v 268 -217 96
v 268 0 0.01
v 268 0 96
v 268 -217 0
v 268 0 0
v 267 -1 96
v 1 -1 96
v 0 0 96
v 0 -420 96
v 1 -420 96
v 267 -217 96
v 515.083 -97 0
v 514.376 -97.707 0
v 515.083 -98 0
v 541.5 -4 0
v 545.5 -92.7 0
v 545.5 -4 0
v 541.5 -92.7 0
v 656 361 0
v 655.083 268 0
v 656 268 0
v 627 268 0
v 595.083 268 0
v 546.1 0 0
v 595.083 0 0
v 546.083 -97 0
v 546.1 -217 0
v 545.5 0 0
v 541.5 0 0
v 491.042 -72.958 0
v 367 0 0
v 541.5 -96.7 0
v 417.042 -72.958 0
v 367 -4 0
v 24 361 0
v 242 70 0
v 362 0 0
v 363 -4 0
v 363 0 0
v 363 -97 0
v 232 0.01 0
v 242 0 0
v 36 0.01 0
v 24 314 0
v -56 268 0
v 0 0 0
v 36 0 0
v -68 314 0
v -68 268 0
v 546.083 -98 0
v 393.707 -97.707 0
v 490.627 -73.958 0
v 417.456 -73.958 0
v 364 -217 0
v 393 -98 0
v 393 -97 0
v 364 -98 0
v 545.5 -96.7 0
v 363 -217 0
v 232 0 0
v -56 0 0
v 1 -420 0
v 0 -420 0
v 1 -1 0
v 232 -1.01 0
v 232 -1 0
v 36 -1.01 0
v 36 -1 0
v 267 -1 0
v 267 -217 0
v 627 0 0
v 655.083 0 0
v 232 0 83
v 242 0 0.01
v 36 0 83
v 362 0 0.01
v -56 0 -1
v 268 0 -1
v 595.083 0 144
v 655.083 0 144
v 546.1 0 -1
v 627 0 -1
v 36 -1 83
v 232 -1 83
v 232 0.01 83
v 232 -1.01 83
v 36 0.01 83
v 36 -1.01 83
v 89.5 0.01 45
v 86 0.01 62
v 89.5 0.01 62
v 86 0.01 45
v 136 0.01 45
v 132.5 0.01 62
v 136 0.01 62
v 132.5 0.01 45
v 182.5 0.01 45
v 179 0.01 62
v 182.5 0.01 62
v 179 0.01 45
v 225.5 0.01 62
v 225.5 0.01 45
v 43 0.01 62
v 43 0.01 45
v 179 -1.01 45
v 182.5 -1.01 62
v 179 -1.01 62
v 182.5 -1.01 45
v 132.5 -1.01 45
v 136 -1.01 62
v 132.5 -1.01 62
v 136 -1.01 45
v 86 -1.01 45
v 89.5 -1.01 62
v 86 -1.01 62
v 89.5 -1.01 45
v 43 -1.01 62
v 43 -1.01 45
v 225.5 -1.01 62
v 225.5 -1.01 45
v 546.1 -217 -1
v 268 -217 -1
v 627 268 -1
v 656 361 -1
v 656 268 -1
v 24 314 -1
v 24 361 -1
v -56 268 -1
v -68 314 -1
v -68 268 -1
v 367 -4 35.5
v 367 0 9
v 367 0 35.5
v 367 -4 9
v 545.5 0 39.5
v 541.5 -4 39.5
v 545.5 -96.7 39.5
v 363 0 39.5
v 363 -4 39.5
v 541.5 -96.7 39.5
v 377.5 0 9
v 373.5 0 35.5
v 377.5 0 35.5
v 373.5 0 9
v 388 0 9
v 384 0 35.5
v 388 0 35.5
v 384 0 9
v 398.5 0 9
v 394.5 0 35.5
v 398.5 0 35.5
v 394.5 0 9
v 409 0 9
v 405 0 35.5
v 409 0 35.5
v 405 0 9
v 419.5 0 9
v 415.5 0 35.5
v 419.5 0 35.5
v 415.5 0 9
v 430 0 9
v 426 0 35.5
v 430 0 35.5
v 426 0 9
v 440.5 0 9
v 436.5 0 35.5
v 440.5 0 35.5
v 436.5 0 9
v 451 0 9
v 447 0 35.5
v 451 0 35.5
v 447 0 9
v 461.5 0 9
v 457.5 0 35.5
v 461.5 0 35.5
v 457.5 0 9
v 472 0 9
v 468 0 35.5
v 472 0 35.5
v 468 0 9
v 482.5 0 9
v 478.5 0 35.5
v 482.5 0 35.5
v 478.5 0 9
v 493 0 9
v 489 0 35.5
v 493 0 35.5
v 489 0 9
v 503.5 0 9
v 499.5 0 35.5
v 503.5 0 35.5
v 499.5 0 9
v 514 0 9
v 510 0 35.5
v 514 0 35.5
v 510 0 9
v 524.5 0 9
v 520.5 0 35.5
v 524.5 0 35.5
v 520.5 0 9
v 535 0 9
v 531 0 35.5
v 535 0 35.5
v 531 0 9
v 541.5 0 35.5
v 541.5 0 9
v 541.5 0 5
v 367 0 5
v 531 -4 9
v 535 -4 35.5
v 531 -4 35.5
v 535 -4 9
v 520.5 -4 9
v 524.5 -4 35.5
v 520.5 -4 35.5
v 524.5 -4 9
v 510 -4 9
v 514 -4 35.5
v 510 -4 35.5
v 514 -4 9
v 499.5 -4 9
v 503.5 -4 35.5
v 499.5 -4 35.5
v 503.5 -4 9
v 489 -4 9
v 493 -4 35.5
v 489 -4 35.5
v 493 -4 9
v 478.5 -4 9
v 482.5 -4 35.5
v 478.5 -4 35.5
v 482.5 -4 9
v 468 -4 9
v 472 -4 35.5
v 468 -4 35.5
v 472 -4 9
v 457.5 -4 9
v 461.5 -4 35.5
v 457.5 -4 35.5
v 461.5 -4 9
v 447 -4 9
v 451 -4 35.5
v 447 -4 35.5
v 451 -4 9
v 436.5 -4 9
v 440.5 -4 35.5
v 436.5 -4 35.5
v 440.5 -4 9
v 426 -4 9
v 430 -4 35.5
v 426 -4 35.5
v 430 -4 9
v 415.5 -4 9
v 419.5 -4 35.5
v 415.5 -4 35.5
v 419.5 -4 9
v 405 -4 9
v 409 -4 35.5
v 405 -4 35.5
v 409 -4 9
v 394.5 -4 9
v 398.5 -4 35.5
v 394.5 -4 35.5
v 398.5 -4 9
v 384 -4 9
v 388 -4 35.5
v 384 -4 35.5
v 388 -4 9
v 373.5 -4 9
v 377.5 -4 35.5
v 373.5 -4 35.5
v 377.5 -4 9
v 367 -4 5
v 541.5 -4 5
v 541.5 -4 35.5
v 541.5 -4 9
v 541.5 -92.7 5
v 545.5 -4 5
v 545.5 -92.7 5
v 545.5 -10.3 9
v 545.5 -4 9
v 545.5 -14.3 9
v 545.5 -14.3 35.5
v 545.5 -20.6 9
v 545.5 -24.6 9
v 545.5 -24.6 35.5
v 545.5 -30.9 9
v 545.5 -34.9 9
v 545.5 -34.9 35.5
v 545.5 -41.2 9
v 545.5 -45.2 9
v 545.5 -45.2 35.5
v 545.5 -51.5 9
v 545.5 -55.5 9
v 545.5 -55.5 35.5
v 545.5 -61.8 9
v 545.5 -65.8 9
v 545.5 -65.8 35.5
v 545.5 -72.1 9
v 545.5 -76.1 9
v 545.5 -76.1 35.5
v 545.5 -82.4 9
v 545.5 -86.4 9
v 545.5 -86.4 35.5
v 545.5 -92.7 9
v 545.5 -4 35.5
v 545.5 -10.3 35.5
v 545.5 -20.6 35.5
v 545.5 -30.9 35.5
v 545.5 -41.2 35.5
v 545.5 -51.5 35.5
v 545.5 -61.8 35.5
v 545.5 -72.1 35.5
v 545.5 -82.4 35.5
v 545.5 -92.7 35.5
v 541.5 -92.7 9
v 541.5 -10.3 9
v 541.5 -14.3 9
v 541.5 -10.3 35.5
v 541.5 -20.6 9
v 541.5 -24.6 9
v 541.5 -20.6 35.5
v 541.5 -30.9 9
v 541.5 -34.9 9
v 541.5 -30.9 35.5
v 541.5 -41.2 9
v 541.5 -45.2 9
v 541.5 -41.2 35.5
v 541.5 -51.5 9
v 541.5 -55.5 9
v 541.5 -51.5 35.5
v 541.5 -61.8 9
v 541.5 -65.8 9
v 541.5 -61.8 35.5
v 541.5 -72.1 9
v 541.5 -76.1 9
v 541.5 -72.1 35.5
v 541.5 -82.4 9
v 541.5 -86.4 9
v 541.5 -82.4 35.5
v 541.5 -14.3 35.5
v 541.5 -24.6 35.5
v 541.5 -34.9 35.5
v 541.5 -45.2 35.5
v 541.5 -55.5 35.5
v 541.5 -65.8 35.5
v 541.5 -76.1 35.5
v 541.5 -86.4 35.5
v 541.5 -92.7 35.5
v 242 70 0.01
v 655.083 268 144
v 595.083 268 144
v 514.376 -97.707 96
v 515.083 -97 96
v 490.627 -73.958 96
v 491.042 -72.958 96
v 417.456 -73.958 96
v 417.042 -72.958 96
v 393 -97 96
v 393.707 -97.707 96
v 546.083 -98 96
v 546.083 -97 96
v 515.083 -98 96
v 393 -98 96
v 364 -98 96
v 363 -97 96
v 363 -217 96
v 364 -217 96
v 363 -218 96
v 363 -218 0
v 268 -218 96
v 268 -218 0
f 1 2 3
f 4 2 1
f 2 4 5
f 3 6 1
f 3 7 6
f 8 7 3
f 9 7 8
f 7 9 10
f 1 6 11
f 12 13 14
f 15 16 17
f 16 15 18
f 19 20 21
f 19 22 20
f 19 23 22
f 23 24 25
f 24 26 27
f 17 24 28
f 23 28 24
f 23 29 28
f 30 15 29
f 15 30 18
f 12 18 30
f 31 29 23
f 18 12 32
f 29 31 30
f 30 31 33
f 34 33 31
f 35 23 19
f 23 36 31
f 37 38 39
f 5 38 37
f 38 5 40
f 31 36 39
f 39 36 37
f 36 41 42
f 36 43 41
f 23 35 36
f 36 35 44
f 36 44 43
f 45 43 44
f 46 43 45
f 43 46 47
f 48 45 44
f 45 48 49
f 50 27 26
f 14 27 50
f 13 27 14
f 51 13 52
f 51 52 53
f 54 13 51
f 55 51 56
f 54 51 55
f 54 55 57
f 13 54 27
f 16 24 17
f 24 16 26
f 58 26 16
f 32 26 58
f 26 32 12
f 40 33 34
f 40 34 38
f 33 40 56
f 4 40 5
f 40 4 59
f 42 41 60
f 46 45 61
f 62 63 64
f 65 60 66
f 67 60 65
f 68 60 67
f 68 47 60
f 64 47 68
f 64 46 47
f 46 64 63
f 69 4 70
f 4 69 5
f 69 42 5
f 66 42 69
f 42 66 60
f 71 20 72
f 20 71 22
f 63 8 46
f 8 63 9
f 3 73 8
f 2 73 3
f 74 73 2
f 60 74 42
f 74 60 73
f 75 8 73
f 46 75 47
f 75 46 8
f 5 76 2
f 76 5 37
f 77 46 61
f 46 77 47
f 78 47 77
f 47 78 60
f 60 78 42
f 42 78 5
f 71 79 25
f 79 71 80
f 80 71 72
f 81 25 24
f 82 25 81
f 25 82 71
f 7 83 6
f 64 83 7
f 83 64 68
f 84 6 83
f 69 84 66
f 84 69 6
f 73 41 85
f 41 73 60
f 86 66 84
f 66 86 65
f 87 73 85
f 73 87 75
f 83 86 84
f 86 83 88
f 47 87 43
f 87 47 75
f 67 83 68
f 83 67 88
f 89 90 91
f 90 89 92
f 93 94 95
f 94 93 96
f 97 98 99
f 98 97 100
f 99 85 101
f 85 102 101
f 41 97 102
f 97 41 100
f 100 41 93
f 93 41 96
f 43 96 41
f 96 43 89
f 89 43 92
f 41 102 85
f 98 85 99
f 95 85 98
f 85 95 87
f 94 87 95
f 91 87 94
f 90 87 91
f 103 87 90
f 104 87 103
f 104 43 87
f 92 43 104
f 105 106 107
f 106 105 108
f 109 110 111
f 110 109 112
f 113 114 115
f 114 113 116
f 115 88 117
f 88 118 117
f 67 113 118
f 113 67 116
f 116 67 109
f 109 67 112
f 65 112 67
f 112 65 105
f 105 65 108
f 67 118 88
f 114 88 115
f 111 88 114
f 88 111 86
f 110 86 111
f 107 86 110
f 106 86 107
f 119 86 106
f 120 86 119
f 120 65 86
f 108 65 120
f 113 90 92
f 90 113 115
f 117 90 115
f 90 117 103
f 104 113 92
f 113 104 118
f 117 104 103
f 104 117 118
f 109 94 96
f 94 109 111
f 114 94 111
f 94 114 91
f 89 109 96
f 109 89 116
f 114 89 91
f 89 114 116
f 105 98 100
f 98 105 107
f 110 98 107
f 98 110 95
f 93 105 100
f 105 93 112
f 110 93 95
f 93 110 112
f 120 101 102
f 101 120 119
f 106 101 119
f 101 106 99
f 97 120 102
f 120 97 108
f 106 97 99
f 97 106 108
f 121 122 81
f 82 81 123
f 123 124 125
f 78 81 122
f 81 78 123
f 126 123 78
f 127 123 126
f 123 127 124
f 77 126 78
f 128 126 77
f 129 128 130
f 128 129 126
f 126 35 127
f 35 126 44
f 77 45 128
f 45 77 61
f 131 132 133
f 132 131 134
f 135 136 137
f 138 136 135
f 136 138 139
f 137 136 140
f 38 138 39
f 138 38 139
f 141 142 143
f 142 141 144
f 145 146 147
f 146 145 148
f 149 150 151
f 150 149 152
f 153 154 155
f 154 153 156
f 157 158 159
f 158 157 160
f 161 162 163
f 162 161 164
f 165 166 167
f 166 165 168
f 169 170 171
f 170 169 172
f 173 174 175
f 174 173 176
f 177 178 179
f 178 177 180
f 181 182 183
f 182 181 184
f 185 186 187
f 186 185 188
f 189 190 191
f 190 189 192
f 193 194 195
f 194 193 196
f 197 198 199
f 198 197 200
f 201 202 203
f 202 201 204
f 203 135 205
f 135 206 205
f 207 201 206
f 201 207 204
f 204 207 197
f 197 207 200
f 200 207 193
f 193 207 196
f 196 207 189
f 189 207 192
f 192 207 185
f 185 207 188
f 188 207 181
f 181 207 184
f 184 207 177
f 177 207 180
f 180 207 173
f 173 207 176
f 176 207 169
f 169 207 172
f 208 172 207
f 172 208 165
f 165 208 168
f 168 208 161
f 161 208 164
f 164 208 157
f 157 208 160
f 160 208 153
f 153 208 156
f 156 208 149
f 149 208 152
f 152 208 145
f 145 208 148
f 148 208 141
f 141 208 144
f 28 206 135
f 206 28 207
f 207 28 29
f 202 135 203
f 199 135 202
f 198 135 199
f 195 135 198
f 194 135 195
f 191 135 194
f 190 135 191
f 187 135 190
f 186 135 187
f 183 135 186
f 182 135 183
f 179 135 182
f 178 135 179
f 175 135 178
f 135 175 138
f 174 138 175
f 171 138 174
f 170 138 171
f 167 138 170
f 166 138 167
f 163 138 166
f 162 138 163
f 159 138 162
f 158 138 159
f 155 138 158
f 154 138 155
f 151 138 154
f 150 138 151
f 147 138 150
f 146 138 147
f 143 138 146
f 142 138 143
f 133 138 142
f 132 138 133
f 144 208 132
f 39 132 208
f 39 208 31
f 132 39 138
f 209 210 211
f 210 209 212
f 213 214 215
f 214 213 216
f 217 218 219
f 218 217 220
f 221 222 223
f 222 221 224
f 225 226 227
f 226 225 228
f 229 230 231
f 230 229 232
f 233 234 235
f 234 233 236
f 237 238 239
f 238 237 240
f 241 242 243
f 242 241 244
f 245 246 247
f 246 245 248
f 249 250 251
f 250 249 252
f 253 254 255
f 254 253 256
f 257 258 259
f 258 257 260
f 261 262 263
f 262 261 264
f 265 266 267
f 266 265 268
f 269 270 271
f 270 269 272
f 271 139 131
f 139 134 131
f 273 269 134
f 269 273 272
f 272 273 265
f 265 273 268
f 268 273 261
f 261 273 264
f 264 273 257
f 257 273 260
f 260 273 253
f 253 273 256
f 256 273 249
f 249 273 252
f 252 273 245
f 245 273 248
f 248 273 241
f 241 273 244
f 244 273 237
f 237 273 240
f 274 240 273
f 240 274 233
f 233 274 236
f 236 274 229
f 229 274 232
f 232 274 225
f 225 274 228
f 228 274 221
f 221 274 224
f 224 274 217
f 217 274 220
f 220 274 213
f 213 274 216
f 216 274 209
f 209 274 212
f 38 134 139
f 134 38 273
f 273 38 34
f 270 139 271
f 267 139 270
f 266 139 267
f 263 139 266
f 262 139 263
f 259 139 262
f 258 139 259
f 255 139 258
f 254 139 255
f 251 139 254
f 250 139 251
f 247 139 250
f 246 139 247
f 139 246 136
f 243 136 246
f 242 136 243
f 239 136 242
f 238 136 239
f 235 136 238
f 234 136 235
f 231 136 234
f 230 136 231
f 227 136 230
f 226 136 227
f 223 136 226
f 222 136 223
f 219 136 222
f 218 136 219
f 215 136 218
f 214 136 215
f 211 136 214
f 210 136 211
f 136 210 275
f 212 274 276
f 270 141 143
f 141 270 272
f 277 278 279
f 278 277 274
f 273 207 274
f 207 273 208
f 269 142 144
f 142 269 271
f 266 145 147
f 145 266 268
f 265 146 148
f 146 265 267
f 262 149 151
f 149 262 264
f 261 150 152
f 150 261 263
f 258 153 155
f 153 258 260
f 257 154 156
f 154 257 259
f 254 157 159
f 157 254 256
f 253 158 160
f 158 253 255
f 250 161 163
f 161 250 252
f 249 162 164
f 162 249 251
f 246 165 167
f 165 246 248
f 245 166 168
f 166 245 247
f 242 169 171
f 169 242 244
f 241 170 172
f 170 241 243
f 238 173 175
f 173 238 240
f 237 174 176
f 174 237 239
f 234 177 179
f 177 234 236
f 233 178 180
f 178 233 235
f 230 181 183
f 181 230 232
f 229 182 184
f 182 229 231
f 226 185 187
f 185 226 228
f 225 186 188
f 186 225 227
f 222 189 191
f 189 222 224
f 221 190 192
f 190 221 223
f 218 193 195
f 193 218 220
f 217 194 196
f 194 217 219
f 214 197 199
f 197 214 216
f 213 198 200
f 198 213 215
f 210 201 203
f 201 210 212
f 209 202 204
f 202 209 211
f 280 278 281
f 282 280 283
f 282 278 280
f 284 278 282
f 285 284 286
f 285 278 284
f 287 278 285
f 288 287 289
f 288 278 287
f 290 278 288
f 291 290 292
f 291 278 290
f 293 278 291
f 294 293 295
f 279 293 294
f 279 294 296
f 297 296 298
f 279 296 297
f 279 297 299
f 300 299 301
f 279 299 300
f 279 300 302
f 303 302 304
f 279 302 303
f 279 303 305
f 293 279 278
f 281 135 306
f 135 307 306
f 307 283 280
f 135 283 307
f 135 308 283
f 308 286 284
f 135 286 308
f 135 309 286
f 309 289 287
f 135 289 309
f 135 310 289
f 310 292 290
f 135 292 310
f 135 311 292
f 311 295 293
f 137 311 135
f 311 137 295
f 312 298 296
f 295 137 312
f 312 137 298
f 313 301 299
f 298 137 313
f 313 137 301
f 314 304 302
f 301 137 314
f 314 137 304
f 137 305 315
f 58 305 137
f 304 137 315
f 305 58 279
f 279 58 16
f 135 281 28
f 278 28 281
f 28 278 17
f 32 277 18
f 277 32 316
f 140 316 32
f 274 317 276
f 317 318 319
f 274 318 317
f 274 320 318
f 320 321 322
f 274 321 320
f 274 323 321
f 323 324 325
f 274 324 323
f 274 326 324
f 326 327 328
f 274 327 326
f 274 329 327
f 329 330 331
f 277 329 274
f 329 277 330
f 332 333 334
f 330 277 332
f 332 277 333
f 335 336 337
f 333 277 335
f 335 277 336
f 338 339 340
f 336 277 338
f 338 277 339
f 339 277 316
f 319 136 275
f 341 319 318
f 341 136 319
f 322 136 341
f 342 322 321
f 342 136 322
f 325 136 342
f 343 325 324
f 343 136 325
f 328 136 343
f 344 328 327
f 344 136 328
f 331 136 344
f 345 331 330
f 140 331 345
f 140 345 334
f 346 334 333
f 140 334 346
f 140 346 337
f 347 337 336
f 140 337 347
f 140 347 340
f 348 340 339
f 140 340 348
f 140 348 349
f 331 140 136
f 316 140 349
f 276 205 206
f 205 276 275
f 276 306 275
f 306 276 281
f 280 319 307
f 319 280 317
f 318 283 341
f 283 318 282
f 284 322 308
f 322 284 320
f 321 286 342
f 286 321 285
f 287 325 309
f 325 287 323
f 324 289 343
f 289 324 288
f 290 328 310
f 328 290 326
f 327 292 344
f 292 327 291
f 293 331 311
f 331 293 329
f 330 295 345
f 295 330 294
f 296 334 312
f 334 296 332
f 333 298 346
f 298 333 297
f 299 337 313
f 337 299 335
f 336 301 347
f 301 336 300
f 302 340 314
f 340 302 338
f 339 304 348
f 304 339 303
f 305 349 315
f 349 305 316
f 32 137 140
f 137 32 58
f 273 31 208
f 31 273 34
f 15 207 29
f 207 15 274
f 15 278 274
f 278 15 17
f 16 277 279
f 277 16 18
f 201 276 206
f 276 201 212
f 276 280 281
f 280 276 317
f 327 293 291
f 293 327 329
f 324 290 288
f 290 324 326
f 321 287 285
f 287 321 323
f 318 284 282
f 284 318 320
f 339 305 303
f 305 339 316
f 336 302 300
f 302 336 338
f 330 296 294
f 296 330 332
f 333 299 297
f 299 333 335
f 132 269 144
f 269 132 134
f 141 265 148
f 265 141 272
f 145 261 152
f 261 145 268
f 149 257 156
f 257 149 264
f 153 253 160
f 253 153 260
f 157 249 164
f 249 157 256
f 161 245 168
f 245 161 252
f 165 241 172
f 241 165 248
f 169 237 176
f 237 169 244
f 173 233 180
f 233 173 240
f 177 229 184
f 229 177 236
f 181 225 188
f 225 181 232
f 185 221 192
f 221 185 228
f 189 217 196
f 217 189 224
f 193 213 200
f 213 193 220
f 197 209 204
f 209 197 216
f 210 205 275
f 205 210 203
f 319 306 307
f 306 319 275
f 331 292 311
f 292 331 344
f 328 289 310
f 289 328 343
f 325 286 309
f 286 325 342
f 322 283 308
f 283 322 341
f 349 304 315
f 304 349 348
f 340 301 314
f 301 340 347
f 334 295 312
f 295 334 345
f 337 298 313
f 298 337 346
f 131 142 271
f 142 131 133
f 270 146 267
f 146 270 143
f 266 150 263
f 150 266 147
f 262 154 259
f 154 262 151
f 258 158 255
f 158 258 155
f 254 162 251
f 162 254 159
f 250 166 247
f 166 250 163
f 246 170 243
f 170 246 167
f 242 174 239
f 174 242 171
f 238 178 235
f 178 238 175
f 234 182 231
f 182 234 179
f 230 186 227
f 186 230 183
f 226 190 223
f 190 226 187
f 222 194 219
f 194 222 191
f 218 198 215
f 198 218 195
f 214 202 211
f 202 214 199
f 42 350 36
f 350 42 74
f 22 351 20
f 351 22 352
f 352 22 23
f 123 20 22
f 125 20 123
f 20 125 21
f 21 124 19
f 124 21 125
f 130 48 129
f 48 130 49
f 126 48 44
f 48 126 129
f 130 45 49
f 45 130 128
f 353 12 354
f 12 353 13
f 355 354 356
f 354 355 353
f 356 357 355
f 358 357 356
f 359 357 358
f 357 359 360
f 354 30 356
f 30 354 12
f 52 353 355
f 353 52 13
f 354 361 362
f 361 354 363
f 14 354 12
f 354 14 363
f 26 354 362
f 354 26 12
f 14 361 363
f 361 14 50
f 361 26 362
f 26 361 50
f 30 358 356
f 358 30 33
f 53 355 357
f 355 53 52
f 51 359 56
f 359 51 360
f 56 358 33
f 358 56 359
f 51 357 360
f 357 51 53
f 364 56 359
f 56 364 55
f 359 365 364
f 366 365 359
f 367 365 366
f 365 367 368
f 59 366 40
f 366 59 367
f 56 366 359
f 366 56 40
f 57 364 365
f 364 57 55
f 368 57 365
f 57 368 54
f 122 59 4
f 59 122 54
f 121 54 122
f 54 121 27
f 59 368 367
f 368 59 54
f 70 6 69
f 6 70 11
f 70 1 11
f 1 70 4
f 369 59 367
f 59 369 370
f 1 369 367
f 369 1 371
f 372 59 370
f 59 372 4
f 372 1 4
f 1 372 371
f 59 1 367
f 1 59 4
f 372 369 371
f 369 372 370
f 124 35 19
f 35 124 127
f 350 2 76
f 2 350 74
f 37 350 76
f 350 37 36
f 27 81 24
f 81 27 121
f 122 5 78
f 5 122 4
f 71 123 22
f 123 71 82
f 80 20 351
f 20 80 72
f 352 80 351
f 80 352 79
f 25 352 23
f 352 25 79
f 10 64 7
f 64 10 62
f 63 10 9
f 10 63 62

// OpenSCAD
// -*- mode: scad; orgstruct-heading-prefix-regexp: "// " -*-
wallHeight = 96;

// * Garage
garageDoor = [196, 1.02, 83];
garageDoorEnclosing = [garageDoor.x + 36 * 2, 1, wallHeight];

difference() {
    union() {
        translate([0,-1,0])
            cube(garageDoorEnclosing);

        color("red")
            translate([36,-1.01,0])
            cube(garageDoor);
    }
    
    for (i = [0,1,2,3]) {
        translate([43+46.5*i, -1.05, 45])
            cube([43, 1.09, 17]);
    }
}


// * Driveway
driveway = [18*12+2, (22*12+4) + (7*12+9), 1];
color("lightgrey")
translate([24,0, -1])
cube(driveway);

// ** Triangle
color("lightgrey")
translate([24+driveway.x,0,-1]) {
    linear_extrude(height=1.01)
    polygon(points=[[0,0], [120, 0], [0,70]]);
}

// * Path
module path_small() {
    function redish() = [rands(.7,.9,1)[0],rands(.1,.2,1)[0],rands(.1,.2,1)[0]];
    color(redish())
    cube([16,24,1]);
 
    color(redish())
    translate([16,0,0])
    cube([24,16,1]);

    color(redish())
    translate([0,24,0])
    cube([16,8,1]);

    color(redish())
    translate([16,16,0])
    cube([16,16,1]);

    color(redish())
    translate([32,16,0])
    cube([8,16,1]);

    color(redish())
    translate([0,32,0])
    cube([24,16,1]);
    
    color(redish())
    translate([24,32,0])
    cube([16,16,1]);
}
translate([-16,0,-1])
path_small();

translate([-56,0,-1])
path_small();

color("brown")
translate([-56,48,-1])
cube([80,220,1]);
// 

// * Porch
color("lightgrey")
translate([garageDoorEnclosing.x, -northEntryWall.y, -1])
cube([doorEntryWall.x+183.1, northEntryWall.y,1]);

// ** Railings
numFrontRails = 17;
numSideRails = 9;
color([.5,.5,.5])
translate([garageDoorEnclosing.x + doorEntryWall.x,-4,5]) {
    // bottom front
    cube([numFrontRails * 10.5,4,4]);

    // top front
    translate([0,0,30.5])
    cube([numFrontRails * 10.5,4,4]);

    // front pickets
    for (i = [0 : numFrontRails])
        translate([i*10.5,0,0])
            cube([4,4,34.5]);

    // bottom left
    translate([numFrontRails * 10.5,-numSideRails * 10.3,0])
    cube([4,numSideRails*10.5,4]);

    // top left
    translate([numFrontRails * 10.5,-numSideRails * 10.3,30.5])
    cube([4,numSideRails*10.5,4]);

    // left pickets
    translate([numFrontRails * 10.5,0,0])
        for (i = [0 : numSideRails])
            translate([0,-10.3*i,0])
                cube([4,4,34.5]);

    translate([0,0,-5]) {
    // front right foot
        cube([4,4,5]);
    // front left foot
        translate([numFrontRails*10.5,0])
        cube([4,4,5]);
    // left back foot
        translate([numFrontRails*10.5,-numSideRails*10.3])
        cube([4,4,5]);
    }
}

// * Yard
yard = [32*12+1, 22*12+4,1];
color("grey")
translate([driveway.x+24, 0, -1])
cube(yard);
// ** Arborvida
color("green")
translate([houseSouthSide.x+49,0,0])
cube([60,268,144]);
// ** barkdust bed
*color("brown")
translate([garageDoorEnclosing.x + doorEntryWall.x,0,-1])
linear_extrude(height=1.01)
polygon(points=[[0,0],
                [10, 20],
                [20, 28],
                [30, 35],
                [40, 37],
                [50, 39],
                [60, 40],
                [70, 41],
                [80, 42],
                [90, 43],
                [100, 43],
                [110, 43],
                [120, 42],
                [130, 41],
                [140, 39],
                [150, 35],
                [160, 28],
                [170, 20],
                [180, 0]
            ]);

// ** new path
module foo(x,y,x1,y1) {
    translate([x,y])
        cube([x1,y1,1]);
}

// top line
*translate([25+driveway.x,0,-1])
linear_extrude(height=2.01)
polygon(points=[
[80,24],
[80,32],
[72, 32],
[72, 40],
[64, 40],
[64, 48],
[64, 56],                
[56, 56],
[56, 64],
[56, 72],
[48, 72],
[48, 80],
[48, 88],
[48, 96],
[48, 104],
[56, 104],
[56, 112],
[56, 120],
[64, 120],
[64, 128],
[72, 128],
[80, 128],
[80, 136],
[88, 136],
[96, 136],
[96, 144],
[104, 144],
[112, 144],
[120, 144],
[120, 136],
[128, 136],
[136, 136],
[136, 128],
[144, 128],
[152, 128],
[152, 120],
[160, 120],
[168, 120],
[168, 112],
[176, 112],
[184, 112],
[184, 104],
[192, 104],
[200, 104],
[200, 96],
[208, 96],
[216, 96],
[216, 88],
[224, 88],
[232, 88],
[232, 80],
[240, 80],
[248, 80],
[248, 72],
[256, 72],
[264, 72],
[264, 64],
[272, 64],
[272, 56],
[280, 56],
[280, 48],
[288, 48],
[288, 40],
[288, 32],
[296, 32],
[296, 24],
[296, 16],
[304, 16],
[304, 8],
[304, 0],
[120, 0]
            ]);

// bottom line
*translate([55+driveway.x,0,-1])
linear_extrude(height=2.01)
polygon(points=[
[48,268],
[48,260],
[48,252],
[56,252],
[56,244],
[64,244],
[64,236],
[72,236],
[72,228],
[80,228],
[80,220],
[88,220],
[96,220],
[96,212],
[104,212],
[112,212],
[112,204],
[120,204],
[128,204],
[128,196],
[136,196],


[350,268]
]);


*translate([25+driveway.x,0]) {
    foo(0,100,16,16);
}

// * Sidewalk
sidewalk = [46,46,1];
function greyish() = rands(.8,.9,3);
for (i = [0 : 8]){
    color(greyish())
        translate([24 + driveway.x + i*sidewalk.x, 22*12+4, -1])
        cube(sidewalk);
}

for (i = [0 : 1]) {
    color(greyish())
        translate([26-47*2 + i*sidewalk.x, 22*12+4, -1])
        cube(sidewalk);
}



// * Planter Strip
color("green")
translate([24+driveway.x, 22*12+4 + sidewalk.y, -1])
cube([100+6,47,1]);

color("red")
translate([24+driveway.x + 100+6, 22*12+4 + sidewalk.y, -1])
cube([96+6,47,1]);

color("green")
translate([24+driveway.x + 100 +96+12, 22*12+4 + sidewalk.y, -1])
cube([114+6,47,1]);

// neighbors river rock on our property
color("red")
translate([24+driveway.x + 100 +96+18+114, 22*12+4 + sidewalk.y, -1])
cube([86,47,1]);

// * Entry Walls

translate([0,-35*12,0])
cube([1,35*12,wallHeight]);

northEntryWall = [1, 217];
doorEntryWall = [95,1];
southEntryWall = [1, 120];
northBaySide = [30, 1];
southBaySide = [31, 1];
sideBayWindowEnclosure = [8+18+8, 1];
bayWindowEnclosure = [7+60+7, 1];
houseSouthSide = [
    garageDoorEnclosing.x +
    doorEntryWall.x +
    northBaySide.x +
    cos(45) * sideBayWindowEnclosure.x +
    bayWindowEnclosure.x +
    cos(45) * sideBayWindowEnclosure.x +
    southBaySide.x,
    -northEntryWall.y + southEntryWall.y
    ];

translate([garageDoorEnclosing.x, -northEntryWall.y, 0]) {
    translate([-1,0,0])
    cube([1, northEntryWall.y, wallHeight]);
    translate([0, -1, 0])
    cube([doorEntryWall.x,1,wallHeight]);
    translate([doorEntryWall.x,0,0]) {
        cube([1, southEntryWall.y, wallHeight]);
        translate([0,southEntryWall.y,0]) {
            translate([0,-1,0])
            cube([northBaySide.x, 1, wallHeight]);
            translate([30,0,0]) {
                rotate([0,0,45]) {
                    translate([0,-1,0])
                    cube([sideBayWindowEnclosure.x,1,wallHeight]);
                    translate([sideBayWindowEnclosure.x,0,0]) {
                        rotate([0,0,-45]) {
                            translate([0,-1,0])
                            cube([bayWindowEnclosure.x,1,wallHeight]);
                            translate([bayWindowEnclosure.x,0,0]) {
                                rotate([0,0,-45]) {
                                    translate([0,-1,0])
                                    cube([sideBayWindowEnclosure.x,1,wallHeight]);
                                    translate([sideBayWindowEnclosure.x,0,0]) {
                                        rotate([0,0,45]) {
                                            translate([0,-1,0])
                                            cube([southBaySide.x, 1, wallHeight]);
                                        }
                                    }
                                }
                            }
                        }
                    }
                }
            }
        }
    }
}

// * Notes

/*
100 // driveway to bricks 
96 // bricks
114 // bricks to neighbors

42 // planter strip width
39 // side path width
63 // side path length

338 
26 of neighbors river rock on our property
12 of arborvida at edge of yard

106 // south of center line of driveway
108 // north of center line of driveway
10 // wider than south of garage door
11 // wider than north of garage door

*/

// * Bezier curves
/* 
        Bernstein Basis Functions 

        For Bezier curves, these functions give the weights per control point. 

*/ 
function BEZ03(u) = pow((1-u), 3); 
function BEZ13(u) = 3*u*(pow((1-u),2)); 
function BEZ23(u) = 3*(pow(u,2))*(1-u); 
function BEZ33(u) = pow(u,3); 

// Calculate a singe point along a cubic bezier curve 
// Given a set of 4 control points, and a parameter 0 <= 'u' <= 1 
// These functions will return the exact point on the curve 
function PointOnBezCubic2D(p0, p1, p2, p3, u) = [ 
        BEZ03(u)*p0[0]+BEZ13(u)*p1[0]+BEZ23(u)*p2[0]+BEZ33(u)*p3[0], 
        BEZ03(u)*p0[1]+BEZ13(u)*p1[1]+BEZ23(u)*p2[1]+BEZ33(u)*p3[1]]; 

function PointOnBezCubic3D(p0, p1, p2, p3, u) = [ 
        BEZ03(u)*p0[0]+BEZ13(u)*p1[0]+BEZ23(u)*p2[0]+BEZ33(u)*p3[0], 
        BEZ03(u)*p0[1]+BEZ13(u)*p1[1]+BEZ23(u)*p2[1]+BEZ33(u)*p3[1], 
        BEZ03(u)*p0[2]+BEZ13(u)*p1[2]+BEZ23(u)*p2[2]+BEZ33(u)*p3[2]];

color("green")
translate([25+driveway.x+120,0,1.01]) {
    upperPoints = [
        [0,0],
        for (u = [0 : .004 : 1])  PointOnBezCubic2D(
            [-120, 70] * .25,
            [-160, 200],
            [70,240],
            [180,0], u) 
    ];
    polygon(upperPoints);

}

color("green")
translate([25+driveway.x+50,0,1.02]) {
    c=[302,269];
    lowerPoints = [
        for (u = [0 : .01 : 1])  PointOnBezCubic2D(
            [0,c.y],
            [00,220],
            [200,280],
            [c.x,20], u),
        c
    ];
    echo(lowerPoints);
    polygon(lowerPoints);
}
